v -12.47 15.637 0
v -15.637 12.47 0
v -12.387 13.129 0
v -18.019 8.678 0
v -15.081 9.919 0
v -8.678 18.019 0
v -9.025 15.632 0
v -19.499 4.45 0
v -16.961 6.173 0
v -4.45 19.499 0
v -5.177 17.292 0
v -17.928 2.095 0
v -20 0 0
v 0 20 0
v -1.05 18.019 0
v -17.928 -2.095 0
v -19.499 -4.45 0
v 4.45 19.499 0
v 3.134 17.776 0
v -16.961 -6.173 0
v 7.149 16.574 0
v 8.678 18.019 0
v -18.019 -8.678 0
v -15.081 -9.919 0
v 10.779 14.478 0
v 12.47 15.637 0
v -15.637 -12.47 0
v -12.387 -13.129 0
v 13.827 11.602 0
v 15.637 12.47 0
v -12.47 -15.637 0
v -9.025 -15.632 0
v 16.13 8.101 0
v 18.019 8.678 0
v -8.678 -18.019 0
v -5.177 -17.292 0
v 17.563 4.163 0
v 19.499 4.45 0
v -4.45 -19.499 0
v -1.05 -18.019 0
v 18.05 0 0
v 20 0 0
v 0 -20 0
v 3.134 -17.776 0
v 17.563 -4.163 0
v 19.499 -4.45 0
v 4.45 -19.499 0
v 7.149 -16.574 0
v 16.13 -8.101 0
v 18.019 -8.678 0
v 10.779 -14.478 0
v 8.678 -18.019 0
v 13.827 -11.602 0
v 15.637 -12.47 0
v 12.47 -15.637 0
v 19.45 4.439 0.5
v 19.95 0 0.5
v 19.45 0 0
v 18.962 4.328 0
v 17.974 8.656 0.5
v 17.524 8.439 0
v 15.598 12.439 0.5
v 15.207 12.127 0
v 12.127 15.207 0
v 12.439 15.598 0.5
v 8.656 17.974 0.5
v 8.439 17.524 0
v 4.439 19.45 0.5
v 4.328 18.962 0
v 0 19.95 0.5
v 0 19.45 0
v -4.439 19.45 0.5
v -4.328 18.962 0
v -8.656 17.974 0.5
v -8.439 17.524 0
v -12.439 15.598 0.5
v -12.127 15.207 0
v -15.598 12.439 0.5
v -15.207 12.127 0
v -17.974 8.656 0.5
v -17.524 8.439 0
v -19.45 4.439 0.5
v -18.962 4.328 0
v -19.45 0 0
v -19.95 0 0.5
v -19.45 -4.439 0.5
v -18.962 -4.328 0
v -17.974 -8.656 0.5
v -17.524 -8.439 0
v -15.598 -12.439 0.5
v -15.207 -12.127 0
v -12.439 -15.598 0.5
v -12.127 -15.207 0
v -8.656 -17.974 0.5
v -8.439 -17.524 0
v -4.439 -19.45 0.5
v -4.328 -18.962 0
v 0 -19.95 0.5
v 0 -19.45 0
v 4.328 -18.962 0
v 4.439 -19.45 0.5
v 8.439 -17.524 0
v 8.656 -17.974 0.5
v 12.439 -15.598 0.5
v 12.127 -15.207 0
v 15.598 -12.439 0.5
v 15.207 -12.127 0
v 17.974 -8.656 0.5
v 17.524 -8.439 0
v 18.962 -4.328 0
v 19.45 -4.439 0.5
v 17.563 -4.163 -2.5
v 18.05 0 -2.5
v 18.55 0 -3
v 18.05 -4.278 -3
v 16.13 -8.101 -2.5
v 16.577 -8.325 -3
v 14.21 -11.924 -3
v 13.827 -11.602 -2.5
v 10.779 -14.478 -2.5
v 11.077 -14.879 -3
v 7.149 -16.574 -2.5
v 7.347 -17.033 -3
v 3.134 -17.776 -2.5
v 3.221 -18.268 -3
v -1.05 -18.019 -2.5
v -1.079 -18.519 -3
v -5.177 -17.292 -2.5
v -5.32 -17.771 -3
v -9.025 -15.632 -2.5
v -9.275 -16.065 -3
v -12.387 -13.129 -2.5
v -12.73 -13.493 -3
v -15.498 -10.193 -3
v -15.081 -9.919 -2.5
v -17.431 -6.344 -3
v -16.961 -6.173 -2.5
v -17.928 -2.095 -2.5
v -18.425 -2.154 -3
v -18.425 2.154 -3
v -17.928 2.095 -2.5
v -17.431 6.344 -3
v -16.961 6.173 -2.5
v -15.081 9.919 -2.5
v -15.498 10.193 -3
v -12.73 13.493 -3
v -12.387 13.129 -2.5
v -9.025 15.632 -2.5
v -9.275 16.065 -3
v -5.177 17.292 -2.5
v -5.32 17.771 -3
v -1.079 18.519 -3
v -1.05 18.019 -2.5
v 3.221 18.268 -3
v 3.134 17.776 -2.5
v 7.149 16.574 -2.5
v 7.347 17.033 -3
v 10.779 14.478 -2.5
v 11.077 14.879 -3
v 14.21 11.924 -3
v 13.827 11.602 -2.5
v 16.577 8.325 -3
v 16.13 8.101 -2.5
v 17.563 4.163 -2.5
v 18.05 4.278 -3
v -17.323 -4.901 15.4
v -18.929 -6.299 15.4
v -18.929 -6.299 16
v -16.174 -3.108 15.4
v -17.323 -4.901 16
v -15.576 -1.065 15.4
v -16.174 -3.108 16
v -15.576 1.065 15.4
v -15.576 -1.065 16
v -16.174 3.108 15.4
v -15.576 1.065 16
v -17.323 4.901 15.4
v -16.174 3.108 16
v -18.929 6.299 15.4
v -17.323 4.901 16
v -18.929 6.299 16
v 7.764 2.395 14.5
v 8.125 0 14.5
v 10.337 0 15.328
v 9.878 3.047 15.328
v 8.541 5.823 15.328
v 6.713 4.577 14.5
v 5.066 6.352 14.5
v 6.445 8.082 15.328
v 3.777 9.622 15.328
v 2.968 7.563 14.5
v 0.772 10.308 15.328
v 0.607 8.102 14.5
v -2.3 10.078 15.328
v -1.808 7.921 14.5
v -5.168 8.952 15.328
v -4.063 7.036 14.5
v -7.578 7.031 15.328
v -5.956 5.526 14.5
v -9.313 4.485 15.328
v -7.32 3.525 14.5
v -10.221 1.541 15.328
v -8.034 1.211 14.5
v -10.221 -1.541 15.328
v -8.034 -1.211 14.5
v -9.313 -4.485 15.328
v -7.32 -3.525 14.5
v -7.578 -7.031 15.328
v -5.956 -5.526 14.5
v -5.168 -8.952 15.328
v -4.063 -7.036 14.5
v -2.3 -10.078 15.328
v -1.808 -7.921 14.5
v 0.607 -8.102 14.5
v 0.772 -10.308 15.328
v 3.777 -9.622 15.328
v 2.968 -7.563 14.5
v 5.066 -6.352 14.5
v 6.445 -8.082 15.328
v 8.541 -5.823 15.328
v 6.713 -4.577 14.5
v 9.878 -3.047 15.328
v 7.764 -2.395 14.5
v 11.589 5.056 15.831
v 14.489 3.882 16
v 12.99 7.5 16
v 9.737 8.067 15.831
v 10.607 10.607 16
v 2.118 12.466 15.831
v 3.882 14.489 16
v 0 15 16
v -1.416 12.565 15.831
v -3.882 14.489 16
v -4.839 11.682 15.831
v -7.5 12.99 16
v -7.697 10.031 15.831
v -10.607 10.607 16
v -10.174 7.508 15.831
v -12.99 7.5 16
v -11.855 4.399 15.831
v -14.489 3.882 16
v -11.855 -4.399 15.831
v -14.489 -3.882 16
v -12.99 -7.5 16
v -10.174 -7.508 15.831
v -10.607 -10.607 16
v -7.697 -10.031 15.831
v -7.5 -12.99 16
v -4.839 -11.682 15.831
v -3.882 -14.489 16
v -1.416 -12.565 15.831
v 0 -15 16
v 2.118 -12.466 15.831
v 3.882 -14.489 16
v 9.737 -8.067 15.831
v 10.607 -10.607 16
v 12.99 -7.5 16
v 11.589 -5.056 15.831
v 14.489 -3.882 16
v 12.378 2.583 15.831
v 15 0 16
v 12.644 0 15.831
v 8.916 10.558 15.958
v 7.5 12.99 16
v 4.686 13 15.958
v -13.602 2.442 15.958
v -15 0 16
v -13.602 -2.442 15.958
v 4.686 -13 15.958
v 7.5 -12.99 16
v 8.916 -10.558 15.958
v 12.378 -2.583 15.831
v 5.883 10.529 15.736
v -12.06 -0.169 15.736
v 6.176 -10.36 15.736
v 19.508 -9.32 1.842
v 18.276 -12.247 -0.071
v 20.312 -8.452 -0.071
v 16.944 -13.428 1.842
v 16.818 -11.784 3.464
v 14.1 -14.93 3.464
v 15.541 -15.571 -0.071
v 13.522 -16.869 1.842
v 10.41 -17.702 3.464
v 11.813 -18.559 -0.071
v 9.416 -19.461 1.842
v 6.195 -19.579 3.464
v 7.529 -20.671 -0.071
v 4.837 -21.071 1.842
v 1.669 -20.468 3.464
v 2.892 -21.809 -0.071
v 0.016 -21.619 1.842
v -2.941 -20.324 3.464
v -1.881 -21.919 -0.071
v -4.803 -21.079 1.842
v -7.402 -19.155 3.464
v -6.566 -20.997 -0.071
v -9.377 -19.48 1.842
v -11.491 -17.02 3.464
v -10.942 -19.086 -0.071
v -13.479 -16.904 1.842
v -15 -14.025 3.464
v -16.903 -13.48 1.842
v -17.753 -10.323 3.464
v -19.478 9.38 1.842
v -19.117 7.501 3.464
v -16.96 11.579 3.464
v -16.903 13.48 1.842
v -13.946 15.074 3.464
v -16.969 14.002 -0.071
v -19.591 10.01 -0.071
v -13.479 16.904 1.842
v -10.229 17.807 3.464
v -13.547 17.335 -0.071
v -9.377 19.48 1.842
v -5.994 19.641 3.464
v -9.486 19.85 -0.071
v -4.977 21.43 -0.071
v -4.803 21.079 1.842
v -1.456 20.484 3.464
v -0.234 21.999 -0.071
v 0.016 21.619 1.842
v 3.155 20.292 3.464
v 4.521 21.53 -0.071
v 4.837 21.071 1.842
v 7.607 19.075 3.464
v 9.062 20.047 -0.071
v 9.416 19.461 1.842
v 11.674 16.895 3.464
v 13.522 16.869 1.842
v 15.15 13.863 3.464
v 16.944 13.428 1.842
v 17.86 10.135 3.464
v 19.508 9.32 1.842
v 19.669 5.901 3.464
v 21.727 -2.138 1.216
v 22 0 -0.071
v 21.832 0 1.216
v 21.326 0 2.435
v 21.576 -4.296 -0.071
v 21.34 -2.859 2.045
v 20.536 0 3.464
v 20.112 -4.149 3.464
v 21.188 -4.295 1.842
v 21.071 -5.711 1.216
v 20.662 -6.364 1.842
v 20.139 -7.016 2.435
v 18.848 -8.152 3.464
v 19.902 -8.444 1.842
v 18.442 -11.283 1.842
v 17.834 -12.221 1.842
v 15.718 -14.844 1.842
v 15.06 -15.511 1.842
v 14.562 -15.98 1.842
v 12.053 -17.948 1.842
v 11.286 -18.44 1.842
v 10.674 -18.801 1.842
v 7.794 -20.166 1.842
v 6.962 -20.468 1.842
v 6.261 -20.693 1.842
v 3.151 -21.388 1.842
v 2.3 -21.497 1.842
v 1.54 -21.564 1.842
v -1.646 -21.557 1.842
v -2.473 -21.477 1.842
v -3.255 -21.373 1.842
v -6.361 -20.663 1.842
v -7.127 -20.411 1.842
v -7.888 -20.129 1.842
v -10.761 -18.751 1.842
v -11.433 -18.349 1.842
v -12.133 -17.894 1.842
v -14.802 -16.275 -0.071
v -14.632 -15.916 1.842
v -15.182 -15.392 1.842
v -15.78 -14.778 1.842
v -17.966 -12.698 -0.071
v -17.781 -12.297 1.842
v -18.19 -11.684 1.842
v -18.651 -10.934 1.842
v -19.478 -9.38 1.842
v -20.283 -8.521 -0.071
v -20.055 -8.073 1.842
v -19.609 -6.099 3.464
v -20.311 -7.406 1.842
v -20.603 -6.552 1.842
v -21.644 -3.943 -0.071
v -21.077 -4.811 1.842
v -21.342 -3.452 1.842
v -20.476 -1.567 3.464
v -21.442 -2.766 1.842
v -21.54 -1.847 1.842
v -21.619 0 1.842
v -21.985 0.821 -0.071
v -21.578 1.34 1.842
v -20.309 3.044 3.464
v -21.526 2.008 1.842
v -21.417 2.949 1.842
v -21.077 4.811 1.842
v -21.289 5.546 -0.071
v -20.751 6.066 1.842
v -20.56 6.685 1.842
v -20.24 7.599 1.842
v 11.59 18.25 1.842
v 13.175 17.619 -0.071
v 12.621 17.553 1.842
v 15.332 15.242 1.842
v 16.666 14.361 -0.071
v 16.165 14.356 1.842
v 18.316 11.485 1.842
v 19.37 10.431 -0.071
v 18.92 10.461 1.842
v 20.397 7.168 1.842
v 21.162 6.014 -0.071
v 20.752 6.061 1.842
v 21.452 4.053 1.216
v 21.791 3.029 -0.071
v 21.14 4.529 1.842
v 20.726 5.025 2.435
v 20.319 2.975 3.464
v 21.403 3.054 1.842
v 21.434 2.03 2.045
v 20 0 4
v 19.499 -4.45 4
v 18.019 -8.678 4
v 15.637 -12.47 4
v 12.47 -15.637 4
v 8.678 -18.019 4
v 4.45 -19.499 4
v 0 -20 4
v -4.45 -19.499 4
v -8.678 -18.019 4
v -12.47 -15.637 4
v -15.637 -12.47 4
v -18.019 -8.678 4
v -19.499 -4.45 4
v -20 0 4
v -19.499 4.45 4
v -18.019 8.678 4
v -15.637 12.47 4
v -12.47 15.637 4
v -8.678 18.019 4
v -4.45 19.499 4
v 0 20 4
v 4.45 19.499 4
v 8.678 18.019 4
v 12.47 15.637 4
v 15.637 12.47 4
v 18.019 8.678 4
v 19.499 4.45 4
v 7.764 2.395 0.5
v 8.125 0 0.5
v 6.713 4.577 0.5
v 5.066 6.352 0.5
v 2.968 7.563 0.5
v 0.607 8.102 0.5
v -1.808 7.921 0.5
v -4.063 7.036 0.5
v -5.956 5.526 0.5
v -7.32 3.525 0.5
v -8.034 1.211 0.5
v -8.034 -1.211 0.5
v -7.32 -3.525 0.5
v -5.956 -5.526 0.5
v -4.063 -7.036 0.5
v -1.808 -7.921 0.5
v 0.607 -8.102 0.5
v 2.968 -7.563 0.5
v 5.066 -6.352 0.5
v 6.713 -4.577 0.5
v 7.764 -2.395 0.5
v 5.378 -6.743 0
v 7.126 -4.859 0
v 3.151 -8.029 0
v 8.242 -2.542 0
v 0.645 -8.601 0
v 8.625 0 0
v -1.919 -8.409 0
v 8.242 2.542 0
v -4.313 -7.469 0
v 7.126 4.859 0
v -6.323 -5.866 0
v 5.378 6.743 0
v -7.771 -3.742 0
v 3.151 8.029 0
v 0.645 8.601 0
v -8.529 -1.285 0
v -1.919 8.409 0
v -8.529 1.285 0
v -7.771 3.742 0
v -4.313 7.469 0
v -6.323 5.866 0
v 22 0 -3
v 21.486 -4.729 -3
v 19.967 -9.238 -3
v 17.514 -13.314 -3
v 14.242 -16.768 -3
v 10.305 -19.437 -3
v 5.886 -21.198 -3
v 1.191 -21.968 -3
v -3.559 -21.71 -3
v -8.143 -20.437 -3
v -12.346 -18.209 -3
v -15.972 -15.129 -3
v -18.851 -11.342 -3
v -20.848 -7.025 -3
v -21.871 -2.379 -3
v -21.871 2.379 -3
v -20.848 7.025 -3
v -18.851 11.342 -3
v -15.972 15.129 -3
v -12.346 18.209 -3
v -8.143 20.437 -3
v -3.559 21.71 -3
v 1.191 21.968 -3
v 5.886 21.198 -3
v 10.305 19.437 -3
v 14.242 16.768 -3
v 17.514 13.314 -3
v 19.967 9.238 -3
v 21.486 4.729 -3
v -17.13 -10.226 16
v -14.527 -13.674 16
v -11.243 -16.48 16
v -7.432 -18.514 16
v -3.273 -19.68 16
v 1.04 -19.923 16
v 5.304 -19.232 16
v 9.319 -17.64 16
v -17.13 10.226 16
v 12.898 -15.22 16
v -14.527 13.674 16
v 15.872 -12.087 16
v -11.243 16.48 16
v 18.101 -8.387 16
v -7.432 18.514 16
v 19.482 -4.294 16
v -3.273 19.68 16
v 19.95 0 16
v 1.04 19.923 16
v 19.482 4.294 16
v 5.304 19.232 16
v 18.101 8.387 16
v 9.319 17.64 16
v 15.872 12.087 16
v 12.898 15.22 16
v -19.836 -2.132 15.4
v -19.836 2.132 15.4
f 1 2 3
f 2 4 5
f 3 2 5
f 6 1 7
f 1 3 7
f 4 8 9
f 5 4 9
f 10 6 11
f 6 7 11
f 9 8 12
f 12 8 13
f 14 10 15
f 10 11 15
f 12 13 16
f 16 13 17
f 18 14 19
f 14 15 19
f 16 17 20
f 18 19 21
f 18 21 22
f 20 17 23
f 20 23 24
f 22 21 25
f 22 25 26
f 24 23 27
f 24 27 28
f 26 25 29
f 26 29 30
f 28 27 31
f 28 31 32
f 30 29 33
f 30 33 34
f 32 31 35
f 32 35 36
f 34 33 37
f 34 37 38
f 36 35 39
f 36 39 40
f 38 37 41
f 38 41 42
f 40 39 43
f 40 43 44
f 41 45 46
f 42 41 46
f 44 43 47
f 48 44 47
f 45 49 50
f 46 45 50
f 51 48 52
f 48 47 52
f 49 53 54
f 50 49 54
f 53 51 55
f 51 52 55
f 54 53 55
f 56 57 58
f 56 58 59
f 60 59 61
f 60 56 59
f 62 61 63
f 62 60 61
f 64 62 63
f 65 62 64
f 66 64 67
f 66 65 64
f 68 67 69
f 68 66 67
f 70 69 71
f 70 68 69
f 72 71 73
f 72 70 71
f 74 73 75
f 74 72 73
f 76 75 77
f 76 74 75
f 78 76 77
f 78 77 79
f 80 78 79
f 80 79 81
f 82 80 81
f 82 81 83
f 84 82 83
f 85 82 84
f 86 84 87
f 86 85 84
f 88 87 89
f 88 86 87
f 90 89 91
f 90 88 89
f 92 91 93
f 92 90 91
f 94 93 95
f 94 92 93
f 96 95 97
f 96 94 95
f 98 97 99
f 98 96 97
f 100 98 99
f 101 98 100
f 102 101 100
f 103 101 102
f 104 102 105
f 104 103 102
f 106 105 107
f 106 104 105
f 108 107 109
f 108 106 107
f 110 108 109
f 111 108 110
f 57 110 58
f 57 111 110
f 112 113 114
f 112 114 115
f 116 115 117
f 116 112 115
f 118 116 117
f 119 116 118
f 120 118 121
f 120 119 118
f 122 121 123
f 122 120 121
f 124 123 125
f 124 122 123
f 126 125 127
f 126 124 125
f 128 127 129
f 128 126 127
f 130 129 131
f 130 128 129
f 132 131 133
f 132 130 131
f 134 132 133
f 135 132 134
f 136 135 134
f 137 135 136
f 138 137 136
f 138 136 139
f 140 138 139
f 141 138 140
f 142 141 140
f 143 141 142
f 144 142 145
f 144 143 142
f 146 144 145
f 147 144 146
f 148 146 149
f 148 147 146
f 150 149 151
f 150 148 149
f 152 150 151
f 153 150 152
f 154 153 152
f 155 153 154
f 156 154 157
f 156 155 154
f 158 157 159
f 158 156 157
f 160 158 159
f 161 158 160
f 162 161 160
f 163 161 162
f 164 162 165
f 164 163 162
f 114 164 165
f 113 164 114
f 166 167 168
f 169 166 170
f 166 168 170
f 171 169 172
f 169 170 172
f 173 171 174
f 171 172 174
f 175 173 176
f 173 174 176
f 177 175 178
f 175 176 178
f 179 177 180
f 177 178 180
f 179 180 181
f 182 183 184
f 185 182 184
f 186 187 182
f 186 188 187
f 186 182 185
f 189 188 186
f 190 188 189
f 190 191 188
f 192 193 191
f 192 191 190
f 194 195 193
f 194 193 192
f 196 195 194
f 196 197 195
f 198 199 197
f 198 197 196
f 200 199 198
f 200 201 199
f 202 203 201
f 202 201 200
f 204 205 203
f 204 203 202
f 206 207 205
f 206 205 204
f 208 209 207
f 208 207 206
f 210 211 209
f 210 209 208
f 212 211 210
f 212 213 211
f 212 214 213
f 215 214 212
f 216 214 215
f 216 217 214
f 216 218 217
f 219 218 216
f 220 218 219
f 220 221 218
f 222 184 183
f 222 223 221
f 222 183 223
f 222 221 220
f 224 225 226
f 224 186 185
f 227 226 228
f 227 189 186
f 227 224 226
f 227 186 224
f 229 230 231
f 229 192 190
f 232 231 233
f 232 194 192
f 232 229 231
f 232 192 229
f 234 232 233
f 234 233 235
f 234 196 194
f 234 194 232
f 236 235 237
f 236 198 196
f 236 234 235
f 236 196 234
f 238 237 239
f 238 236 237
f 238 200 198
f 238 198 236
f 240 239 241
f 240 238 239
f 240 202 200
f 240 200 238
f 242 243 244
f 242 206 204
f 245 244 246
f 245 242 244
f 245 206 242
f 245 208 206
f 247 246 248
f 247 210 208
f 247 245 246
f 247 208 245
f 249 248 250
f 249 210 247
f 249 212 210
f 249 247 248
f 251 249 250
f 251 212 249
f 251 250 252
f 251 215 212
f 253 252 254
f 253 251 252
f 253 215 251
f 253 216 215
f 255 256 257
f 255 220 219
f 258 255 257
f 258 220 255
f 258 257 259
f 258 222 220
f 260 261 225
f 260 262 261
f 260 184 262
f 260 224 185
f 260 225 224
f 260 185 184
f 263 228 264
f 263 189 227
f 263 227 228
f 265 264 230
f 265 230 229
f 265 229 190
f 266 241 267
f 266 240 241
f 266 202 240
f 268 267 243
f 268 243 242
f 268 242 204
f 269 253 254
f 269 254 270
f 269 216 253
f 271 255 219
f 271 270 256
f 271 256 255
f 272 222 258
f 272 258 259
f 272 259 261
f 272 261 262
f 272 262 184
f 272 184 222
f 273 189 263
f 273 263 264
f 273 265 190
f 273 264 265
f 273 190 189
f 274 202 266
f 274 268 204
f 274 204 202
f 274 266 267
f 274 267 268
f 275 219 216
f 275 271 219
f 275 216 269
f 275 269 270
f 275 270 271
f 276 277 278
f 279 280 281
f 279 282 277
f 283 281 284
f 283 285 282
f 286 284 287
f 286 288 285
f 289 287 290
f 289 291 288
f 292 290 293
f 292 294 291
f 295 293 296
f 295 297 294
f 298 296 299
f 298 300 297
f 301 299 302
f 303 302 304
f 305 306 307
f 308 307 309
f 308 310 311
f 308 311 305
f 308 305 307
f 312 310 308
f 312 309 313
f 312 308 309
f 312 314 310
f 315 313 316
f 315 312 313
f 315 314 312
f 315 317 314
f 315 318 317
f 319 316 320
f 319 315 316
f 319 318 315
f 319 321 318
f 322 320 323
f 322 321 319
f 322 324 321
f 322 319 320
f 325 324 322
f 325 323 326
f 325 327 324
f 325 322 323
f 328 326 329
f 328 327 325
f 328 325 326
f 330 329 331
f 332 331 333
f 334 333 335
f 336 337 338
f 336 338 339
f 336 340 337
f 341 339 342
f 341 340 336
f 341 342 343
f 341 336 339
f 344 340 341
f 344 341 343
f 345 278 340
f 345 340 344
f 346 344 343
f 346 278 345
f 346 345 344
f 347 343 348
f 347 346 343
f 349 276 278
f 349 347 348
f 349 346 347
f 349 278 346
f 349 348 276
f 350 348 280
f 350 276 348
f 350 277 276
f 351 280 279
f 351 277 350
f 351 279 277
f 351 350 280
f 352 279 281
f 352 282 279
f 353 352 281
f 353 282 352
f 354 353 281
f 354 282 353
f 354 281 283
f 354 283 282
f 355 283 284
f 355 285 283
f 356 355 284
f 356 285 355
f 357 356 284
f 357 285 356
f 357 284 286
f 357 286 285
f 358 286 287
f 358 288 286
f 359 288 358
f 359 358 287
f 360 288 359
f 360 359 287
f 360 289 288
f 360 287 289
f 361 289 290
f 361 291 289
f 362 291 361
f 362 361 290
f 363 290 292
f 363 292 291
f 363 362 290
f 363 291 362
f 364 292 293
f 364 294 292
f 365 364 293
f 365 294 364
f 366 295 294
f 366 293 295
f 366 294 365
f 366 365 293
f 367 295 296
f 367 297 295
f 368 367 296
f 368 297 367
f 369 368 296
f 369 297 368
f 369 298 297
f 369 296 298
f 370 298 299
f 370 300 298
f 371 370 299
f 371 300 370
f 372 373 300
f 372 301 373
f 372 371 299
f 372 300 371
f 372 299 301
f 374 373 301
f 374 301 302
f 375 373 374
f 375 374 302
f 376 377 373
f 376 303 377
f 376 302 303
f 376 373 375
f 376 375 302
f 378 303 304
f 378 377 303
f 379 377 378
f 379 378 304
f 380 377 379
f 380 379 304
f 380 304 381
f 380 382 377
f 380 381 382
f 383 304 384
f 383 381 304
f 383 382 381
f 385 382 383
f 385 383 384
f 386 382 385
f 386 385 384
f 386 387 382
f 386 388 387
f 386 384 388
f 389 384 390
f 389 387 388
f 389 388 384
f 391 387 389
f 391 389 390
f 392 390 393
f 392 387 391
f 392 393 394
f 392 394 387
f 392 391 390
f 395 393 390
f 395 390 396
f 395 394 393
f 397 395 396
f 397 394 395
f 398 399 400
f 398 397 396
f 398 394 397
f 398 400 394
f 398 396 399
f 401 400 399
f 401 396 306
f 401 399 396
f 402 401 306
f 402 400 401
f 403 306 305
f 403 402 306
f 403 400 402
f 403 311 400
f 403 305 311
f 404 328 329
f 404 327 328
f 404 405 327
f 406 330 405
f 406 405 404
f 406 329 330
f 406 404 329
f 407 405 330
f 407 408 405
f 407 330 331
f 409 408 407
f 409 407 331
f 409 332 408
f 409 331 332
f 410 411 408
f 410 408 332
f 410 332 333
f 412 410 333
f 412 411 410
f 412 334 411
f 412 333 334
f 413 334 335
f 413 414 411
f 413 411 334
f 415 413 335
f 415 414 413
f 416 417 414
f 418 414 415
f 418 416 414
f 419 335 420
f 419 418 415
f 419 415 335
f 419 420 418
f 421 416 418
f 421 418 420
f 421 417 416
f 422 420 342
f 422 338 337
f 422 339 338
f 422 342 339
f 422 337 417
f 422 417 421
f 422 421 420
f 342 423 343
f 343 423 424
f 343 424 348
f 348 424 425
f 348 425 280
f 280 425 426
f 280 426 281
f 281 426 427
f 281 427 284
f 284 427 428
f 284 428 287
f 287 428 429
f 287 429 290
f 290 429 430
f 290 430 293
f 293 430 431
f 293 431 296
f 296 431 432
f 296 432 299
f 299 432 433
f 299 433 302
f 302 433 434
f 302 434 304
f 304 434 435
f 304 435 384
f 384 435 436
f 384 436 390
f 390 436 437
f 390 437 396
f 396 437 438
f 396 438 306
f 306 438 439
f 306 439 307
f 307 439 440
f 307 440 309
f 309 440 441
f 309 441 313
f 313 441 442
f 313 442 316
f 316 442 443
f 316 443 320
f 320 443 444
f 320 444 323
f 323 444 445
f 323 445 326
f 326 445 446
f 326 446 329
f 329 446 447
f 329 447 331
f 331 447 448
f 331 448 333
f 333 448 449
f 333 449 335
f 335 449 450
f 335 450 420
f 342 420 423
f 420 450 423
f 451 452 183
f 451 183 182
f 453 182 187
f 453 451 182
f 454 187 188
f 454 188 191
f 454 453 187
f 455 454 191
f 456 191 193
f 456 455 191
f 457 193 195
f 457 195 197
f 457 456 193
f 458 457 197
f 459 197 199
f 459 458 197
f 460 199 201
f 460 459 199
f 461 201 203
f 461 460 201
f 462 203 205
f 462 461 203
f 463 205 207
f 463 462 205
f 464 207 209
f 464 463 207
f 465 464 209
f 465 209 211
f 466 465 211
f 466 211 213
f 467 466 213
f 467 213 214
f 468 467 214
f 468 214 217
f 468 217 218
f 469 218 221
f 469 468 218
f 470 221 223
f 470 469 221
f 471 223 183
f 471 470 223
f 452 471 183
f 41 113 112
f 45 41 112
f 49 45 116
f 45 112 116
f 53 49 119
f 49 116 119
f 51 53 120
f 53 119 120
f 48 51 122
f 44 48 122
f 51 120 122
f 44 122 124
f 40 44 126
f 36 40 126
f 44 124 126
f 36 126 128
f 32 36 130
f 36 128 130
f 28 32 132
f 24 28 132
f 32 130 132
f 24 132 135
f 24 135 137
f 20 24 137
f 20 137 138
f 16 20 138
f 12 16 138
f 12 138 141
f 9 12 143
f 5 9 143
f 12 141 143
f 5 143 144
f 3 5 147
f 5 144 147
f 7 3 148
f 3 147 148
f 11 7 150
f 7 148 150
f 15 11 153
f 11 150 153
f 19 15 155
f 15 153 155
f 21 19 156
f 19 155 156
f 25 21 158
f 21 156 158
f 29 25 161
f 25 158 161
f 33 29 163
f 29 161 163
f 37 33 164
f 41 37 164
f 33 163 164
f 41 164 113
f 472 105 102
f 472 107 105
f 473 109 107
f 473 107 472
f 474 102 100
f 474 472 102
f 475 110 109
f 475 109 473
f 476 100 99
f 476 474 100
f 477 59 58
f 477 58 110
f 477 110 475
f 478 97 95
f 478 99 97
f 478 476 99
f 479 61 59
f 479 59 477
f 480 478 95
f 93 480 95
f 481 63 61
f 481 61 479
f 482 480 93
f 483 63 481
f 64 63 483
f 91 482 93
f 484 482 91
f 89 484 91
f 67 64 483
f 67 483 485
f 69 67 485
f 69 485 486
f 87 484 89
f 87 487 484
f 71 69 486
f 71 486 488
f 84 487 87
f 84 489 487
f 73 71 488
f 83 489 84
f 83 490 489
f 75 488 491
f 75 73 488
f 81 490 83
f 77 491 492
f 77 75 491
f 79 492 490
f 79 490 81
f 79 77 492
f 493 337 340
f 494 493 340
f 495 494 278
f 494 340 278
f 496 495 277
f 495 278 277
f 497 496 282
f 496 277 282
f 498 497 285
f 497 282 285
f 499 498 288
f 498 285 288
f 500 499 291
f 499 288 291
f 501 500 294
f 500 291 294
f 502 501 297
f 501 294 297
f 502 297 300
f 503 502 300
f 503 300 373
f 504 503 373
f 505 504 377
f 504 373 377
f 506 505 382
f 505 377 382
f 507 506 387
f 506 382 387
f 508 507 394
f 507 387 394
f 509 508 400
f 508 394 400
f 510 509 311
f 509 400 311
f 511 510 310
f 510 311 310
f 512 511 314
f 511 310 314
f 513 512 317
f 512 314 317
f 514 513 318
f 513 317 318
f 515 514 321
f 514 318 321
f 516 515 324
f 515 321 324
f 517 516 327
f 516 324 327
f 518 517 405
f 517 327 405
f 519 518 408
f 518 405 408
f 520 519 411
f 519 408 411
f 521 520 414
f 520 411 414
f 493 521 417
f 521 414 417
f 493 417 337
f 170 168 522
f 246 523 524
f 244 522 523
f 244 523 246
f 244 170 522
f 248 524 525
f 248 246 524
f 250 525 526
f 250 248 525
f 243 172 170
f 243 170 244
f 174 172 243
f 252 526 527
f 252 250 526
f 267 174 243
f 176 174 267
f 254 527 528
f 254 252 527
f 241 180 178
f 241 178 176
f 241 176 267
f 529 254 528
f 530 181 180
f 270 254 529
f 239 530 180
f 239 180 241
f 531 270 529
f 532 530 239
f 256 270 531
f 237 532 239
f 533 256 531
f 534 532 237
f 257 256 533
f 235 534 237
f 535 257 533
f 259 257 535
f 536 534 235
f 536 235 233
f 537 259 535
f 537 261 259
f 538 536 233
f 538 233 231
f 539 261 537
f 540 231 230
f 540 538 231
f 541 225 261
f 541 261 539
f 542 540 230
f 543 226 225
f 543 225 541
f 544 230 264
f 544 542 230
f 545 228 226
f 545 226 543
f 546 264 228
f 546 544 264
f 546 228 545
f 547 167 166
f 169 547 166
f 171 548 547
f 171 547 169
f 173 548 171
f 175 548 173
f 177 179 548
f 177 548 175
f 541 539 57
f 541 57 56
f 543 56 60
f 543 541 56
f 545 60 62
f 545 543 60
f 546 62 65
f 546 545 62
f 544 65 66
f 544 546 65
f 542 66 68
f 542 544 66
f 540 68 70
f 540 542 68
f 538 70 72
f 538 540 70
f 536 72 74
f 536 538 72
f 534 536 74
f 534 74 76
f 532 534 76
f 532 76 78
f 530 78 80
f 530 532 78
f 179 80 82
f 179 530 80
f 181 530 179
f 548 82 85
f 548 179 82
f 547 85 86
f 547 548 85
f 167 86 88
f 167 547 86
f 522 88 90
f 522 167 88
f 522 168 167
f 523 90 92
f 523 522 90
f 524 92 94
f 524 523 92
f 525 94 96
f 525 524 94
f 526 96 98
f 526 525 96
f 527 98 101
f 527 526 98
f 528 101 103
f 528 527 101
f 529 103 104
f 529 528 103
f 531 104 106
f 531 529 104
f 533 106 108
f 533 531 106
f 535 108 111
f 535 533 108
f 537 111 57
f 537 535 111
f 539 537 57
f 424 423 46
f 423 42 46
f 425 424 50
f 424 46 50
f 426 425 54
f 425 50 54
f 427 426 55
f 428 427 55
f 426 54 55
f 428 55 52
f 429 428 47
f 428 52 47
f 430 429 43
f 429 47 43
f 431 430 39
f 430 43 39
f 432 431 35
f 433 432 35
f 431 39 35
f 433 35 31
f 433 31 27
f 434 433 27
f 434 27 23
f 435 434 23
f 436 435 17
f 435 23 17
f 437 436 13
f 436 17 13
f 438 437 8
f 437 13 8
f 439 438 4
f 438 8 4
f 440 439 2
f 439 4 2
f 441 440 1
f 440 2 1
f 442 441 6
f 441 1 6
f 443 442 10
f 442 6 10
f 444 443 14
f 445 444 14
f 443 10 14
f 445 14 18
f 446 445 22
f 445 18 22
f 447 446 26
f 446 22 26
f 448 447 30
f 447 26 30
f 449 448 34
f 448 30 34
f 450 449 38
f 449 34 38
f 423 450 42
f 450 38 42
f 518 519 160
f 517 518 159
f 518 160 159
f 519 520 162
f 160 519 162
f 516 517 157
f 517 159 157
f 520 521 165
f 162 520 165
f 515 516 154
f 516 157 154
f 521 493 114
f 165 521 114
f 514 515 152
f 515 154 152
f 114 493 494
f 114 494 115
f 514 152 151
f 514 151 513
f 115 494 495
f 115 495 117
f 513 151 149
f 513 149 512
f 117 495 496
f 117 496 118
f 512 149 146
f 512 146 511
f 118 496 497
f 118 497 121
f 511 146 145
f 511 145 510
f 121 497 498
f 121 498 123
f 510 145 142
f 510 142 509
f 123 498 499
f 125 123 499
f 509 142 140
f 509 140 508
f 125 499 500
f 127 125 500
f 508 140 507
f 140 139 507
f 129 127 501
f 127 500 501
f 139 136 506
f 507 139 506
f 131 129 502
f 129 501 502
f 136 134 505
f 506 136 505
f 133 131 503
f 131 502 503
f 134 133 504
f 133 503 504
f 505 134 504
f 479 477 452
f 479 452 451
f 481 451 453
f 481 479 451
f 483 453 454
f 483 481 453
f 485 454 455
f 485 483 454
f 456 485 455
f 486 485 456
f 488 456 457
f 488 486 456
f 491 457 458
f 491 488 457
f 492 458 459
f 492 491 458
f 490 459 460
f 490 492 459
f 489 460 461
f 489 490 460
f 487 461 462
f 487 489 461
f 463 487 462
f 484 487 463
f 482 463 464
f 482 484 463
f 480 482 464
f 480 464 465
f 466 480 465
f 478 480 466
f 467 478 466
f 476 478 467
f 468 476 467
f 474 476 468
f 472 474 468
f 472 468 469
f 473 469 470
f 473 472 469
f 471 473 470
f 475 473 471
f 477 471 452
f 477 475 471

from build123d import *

# Parameters (mm, degrees)
F4_R     = 7.5
F5_DEPTH = 0.6
F6_R     = 5
F7_SIZE  = 0.5
F8_SIZE  = 0.5


with BuildPart() as f1:
    # F0 (on Front) → F1 (revolve)
    with BuildSketch(Plane.XZ):
        with BuildLine():
            Line((8.125, 14.5), (8.125, 0))
            Line((8.125, 0), (19.95, 0))
            Line((19.95, 0), (19.95, 16))
            Line((19.95, 16), (15, 16))
            ThreePointArc((15, 16), (11.481633, 15.62064), (8.125, 14.5))
        make_face()
    revolve(axis=Axis((0, 0, 49.408998), (0, 0, 1)))

    # F4 (on face) → F5 (cut)
    with BuildSketch(Plane.XY.offset(16)):
        with Locations((-23, 0)):
            Circle(F4_R)
    extrude(amount=-F5_DEPTH, mode=Mode.SUBTRACT)

    # F8
    f8_edges = [f1.edges().sort_by_distance(p)[0] for p in [
        (-19.95, 0, 0),
        (-8.125, 0, 0),
    ]]
    chamfer(f8_edges, length=F8_SIZE)


with BuildPart() as f3:
    # F2 (on Front) → F3 (revolve)
    with BuildSketch(Plane.XZ):
        Polygon((20, 0), (18.05, 0), (18.05, -3), (22, -3), (22, 2), (20, 4), align=None)
    revolve(axis=Axis((0, 0, -7.16383), (0, 0, -1)))

    # F6
    f6_edges = [f3.edges().sort_by_distance(p)[0] for p in [
        (-22, 0, 2),
    ]]
    fillet(f6_edges, radius=F6_R)

    # F7
    f7_edges = [f3.edges().sort_by_distance(p)[0] for p in [
        (-18.05, 0, -3),
    ]]
    chamfer(f7_edges, length=F7_SIZE)


solid = Compound([f1.part, f3.part])
